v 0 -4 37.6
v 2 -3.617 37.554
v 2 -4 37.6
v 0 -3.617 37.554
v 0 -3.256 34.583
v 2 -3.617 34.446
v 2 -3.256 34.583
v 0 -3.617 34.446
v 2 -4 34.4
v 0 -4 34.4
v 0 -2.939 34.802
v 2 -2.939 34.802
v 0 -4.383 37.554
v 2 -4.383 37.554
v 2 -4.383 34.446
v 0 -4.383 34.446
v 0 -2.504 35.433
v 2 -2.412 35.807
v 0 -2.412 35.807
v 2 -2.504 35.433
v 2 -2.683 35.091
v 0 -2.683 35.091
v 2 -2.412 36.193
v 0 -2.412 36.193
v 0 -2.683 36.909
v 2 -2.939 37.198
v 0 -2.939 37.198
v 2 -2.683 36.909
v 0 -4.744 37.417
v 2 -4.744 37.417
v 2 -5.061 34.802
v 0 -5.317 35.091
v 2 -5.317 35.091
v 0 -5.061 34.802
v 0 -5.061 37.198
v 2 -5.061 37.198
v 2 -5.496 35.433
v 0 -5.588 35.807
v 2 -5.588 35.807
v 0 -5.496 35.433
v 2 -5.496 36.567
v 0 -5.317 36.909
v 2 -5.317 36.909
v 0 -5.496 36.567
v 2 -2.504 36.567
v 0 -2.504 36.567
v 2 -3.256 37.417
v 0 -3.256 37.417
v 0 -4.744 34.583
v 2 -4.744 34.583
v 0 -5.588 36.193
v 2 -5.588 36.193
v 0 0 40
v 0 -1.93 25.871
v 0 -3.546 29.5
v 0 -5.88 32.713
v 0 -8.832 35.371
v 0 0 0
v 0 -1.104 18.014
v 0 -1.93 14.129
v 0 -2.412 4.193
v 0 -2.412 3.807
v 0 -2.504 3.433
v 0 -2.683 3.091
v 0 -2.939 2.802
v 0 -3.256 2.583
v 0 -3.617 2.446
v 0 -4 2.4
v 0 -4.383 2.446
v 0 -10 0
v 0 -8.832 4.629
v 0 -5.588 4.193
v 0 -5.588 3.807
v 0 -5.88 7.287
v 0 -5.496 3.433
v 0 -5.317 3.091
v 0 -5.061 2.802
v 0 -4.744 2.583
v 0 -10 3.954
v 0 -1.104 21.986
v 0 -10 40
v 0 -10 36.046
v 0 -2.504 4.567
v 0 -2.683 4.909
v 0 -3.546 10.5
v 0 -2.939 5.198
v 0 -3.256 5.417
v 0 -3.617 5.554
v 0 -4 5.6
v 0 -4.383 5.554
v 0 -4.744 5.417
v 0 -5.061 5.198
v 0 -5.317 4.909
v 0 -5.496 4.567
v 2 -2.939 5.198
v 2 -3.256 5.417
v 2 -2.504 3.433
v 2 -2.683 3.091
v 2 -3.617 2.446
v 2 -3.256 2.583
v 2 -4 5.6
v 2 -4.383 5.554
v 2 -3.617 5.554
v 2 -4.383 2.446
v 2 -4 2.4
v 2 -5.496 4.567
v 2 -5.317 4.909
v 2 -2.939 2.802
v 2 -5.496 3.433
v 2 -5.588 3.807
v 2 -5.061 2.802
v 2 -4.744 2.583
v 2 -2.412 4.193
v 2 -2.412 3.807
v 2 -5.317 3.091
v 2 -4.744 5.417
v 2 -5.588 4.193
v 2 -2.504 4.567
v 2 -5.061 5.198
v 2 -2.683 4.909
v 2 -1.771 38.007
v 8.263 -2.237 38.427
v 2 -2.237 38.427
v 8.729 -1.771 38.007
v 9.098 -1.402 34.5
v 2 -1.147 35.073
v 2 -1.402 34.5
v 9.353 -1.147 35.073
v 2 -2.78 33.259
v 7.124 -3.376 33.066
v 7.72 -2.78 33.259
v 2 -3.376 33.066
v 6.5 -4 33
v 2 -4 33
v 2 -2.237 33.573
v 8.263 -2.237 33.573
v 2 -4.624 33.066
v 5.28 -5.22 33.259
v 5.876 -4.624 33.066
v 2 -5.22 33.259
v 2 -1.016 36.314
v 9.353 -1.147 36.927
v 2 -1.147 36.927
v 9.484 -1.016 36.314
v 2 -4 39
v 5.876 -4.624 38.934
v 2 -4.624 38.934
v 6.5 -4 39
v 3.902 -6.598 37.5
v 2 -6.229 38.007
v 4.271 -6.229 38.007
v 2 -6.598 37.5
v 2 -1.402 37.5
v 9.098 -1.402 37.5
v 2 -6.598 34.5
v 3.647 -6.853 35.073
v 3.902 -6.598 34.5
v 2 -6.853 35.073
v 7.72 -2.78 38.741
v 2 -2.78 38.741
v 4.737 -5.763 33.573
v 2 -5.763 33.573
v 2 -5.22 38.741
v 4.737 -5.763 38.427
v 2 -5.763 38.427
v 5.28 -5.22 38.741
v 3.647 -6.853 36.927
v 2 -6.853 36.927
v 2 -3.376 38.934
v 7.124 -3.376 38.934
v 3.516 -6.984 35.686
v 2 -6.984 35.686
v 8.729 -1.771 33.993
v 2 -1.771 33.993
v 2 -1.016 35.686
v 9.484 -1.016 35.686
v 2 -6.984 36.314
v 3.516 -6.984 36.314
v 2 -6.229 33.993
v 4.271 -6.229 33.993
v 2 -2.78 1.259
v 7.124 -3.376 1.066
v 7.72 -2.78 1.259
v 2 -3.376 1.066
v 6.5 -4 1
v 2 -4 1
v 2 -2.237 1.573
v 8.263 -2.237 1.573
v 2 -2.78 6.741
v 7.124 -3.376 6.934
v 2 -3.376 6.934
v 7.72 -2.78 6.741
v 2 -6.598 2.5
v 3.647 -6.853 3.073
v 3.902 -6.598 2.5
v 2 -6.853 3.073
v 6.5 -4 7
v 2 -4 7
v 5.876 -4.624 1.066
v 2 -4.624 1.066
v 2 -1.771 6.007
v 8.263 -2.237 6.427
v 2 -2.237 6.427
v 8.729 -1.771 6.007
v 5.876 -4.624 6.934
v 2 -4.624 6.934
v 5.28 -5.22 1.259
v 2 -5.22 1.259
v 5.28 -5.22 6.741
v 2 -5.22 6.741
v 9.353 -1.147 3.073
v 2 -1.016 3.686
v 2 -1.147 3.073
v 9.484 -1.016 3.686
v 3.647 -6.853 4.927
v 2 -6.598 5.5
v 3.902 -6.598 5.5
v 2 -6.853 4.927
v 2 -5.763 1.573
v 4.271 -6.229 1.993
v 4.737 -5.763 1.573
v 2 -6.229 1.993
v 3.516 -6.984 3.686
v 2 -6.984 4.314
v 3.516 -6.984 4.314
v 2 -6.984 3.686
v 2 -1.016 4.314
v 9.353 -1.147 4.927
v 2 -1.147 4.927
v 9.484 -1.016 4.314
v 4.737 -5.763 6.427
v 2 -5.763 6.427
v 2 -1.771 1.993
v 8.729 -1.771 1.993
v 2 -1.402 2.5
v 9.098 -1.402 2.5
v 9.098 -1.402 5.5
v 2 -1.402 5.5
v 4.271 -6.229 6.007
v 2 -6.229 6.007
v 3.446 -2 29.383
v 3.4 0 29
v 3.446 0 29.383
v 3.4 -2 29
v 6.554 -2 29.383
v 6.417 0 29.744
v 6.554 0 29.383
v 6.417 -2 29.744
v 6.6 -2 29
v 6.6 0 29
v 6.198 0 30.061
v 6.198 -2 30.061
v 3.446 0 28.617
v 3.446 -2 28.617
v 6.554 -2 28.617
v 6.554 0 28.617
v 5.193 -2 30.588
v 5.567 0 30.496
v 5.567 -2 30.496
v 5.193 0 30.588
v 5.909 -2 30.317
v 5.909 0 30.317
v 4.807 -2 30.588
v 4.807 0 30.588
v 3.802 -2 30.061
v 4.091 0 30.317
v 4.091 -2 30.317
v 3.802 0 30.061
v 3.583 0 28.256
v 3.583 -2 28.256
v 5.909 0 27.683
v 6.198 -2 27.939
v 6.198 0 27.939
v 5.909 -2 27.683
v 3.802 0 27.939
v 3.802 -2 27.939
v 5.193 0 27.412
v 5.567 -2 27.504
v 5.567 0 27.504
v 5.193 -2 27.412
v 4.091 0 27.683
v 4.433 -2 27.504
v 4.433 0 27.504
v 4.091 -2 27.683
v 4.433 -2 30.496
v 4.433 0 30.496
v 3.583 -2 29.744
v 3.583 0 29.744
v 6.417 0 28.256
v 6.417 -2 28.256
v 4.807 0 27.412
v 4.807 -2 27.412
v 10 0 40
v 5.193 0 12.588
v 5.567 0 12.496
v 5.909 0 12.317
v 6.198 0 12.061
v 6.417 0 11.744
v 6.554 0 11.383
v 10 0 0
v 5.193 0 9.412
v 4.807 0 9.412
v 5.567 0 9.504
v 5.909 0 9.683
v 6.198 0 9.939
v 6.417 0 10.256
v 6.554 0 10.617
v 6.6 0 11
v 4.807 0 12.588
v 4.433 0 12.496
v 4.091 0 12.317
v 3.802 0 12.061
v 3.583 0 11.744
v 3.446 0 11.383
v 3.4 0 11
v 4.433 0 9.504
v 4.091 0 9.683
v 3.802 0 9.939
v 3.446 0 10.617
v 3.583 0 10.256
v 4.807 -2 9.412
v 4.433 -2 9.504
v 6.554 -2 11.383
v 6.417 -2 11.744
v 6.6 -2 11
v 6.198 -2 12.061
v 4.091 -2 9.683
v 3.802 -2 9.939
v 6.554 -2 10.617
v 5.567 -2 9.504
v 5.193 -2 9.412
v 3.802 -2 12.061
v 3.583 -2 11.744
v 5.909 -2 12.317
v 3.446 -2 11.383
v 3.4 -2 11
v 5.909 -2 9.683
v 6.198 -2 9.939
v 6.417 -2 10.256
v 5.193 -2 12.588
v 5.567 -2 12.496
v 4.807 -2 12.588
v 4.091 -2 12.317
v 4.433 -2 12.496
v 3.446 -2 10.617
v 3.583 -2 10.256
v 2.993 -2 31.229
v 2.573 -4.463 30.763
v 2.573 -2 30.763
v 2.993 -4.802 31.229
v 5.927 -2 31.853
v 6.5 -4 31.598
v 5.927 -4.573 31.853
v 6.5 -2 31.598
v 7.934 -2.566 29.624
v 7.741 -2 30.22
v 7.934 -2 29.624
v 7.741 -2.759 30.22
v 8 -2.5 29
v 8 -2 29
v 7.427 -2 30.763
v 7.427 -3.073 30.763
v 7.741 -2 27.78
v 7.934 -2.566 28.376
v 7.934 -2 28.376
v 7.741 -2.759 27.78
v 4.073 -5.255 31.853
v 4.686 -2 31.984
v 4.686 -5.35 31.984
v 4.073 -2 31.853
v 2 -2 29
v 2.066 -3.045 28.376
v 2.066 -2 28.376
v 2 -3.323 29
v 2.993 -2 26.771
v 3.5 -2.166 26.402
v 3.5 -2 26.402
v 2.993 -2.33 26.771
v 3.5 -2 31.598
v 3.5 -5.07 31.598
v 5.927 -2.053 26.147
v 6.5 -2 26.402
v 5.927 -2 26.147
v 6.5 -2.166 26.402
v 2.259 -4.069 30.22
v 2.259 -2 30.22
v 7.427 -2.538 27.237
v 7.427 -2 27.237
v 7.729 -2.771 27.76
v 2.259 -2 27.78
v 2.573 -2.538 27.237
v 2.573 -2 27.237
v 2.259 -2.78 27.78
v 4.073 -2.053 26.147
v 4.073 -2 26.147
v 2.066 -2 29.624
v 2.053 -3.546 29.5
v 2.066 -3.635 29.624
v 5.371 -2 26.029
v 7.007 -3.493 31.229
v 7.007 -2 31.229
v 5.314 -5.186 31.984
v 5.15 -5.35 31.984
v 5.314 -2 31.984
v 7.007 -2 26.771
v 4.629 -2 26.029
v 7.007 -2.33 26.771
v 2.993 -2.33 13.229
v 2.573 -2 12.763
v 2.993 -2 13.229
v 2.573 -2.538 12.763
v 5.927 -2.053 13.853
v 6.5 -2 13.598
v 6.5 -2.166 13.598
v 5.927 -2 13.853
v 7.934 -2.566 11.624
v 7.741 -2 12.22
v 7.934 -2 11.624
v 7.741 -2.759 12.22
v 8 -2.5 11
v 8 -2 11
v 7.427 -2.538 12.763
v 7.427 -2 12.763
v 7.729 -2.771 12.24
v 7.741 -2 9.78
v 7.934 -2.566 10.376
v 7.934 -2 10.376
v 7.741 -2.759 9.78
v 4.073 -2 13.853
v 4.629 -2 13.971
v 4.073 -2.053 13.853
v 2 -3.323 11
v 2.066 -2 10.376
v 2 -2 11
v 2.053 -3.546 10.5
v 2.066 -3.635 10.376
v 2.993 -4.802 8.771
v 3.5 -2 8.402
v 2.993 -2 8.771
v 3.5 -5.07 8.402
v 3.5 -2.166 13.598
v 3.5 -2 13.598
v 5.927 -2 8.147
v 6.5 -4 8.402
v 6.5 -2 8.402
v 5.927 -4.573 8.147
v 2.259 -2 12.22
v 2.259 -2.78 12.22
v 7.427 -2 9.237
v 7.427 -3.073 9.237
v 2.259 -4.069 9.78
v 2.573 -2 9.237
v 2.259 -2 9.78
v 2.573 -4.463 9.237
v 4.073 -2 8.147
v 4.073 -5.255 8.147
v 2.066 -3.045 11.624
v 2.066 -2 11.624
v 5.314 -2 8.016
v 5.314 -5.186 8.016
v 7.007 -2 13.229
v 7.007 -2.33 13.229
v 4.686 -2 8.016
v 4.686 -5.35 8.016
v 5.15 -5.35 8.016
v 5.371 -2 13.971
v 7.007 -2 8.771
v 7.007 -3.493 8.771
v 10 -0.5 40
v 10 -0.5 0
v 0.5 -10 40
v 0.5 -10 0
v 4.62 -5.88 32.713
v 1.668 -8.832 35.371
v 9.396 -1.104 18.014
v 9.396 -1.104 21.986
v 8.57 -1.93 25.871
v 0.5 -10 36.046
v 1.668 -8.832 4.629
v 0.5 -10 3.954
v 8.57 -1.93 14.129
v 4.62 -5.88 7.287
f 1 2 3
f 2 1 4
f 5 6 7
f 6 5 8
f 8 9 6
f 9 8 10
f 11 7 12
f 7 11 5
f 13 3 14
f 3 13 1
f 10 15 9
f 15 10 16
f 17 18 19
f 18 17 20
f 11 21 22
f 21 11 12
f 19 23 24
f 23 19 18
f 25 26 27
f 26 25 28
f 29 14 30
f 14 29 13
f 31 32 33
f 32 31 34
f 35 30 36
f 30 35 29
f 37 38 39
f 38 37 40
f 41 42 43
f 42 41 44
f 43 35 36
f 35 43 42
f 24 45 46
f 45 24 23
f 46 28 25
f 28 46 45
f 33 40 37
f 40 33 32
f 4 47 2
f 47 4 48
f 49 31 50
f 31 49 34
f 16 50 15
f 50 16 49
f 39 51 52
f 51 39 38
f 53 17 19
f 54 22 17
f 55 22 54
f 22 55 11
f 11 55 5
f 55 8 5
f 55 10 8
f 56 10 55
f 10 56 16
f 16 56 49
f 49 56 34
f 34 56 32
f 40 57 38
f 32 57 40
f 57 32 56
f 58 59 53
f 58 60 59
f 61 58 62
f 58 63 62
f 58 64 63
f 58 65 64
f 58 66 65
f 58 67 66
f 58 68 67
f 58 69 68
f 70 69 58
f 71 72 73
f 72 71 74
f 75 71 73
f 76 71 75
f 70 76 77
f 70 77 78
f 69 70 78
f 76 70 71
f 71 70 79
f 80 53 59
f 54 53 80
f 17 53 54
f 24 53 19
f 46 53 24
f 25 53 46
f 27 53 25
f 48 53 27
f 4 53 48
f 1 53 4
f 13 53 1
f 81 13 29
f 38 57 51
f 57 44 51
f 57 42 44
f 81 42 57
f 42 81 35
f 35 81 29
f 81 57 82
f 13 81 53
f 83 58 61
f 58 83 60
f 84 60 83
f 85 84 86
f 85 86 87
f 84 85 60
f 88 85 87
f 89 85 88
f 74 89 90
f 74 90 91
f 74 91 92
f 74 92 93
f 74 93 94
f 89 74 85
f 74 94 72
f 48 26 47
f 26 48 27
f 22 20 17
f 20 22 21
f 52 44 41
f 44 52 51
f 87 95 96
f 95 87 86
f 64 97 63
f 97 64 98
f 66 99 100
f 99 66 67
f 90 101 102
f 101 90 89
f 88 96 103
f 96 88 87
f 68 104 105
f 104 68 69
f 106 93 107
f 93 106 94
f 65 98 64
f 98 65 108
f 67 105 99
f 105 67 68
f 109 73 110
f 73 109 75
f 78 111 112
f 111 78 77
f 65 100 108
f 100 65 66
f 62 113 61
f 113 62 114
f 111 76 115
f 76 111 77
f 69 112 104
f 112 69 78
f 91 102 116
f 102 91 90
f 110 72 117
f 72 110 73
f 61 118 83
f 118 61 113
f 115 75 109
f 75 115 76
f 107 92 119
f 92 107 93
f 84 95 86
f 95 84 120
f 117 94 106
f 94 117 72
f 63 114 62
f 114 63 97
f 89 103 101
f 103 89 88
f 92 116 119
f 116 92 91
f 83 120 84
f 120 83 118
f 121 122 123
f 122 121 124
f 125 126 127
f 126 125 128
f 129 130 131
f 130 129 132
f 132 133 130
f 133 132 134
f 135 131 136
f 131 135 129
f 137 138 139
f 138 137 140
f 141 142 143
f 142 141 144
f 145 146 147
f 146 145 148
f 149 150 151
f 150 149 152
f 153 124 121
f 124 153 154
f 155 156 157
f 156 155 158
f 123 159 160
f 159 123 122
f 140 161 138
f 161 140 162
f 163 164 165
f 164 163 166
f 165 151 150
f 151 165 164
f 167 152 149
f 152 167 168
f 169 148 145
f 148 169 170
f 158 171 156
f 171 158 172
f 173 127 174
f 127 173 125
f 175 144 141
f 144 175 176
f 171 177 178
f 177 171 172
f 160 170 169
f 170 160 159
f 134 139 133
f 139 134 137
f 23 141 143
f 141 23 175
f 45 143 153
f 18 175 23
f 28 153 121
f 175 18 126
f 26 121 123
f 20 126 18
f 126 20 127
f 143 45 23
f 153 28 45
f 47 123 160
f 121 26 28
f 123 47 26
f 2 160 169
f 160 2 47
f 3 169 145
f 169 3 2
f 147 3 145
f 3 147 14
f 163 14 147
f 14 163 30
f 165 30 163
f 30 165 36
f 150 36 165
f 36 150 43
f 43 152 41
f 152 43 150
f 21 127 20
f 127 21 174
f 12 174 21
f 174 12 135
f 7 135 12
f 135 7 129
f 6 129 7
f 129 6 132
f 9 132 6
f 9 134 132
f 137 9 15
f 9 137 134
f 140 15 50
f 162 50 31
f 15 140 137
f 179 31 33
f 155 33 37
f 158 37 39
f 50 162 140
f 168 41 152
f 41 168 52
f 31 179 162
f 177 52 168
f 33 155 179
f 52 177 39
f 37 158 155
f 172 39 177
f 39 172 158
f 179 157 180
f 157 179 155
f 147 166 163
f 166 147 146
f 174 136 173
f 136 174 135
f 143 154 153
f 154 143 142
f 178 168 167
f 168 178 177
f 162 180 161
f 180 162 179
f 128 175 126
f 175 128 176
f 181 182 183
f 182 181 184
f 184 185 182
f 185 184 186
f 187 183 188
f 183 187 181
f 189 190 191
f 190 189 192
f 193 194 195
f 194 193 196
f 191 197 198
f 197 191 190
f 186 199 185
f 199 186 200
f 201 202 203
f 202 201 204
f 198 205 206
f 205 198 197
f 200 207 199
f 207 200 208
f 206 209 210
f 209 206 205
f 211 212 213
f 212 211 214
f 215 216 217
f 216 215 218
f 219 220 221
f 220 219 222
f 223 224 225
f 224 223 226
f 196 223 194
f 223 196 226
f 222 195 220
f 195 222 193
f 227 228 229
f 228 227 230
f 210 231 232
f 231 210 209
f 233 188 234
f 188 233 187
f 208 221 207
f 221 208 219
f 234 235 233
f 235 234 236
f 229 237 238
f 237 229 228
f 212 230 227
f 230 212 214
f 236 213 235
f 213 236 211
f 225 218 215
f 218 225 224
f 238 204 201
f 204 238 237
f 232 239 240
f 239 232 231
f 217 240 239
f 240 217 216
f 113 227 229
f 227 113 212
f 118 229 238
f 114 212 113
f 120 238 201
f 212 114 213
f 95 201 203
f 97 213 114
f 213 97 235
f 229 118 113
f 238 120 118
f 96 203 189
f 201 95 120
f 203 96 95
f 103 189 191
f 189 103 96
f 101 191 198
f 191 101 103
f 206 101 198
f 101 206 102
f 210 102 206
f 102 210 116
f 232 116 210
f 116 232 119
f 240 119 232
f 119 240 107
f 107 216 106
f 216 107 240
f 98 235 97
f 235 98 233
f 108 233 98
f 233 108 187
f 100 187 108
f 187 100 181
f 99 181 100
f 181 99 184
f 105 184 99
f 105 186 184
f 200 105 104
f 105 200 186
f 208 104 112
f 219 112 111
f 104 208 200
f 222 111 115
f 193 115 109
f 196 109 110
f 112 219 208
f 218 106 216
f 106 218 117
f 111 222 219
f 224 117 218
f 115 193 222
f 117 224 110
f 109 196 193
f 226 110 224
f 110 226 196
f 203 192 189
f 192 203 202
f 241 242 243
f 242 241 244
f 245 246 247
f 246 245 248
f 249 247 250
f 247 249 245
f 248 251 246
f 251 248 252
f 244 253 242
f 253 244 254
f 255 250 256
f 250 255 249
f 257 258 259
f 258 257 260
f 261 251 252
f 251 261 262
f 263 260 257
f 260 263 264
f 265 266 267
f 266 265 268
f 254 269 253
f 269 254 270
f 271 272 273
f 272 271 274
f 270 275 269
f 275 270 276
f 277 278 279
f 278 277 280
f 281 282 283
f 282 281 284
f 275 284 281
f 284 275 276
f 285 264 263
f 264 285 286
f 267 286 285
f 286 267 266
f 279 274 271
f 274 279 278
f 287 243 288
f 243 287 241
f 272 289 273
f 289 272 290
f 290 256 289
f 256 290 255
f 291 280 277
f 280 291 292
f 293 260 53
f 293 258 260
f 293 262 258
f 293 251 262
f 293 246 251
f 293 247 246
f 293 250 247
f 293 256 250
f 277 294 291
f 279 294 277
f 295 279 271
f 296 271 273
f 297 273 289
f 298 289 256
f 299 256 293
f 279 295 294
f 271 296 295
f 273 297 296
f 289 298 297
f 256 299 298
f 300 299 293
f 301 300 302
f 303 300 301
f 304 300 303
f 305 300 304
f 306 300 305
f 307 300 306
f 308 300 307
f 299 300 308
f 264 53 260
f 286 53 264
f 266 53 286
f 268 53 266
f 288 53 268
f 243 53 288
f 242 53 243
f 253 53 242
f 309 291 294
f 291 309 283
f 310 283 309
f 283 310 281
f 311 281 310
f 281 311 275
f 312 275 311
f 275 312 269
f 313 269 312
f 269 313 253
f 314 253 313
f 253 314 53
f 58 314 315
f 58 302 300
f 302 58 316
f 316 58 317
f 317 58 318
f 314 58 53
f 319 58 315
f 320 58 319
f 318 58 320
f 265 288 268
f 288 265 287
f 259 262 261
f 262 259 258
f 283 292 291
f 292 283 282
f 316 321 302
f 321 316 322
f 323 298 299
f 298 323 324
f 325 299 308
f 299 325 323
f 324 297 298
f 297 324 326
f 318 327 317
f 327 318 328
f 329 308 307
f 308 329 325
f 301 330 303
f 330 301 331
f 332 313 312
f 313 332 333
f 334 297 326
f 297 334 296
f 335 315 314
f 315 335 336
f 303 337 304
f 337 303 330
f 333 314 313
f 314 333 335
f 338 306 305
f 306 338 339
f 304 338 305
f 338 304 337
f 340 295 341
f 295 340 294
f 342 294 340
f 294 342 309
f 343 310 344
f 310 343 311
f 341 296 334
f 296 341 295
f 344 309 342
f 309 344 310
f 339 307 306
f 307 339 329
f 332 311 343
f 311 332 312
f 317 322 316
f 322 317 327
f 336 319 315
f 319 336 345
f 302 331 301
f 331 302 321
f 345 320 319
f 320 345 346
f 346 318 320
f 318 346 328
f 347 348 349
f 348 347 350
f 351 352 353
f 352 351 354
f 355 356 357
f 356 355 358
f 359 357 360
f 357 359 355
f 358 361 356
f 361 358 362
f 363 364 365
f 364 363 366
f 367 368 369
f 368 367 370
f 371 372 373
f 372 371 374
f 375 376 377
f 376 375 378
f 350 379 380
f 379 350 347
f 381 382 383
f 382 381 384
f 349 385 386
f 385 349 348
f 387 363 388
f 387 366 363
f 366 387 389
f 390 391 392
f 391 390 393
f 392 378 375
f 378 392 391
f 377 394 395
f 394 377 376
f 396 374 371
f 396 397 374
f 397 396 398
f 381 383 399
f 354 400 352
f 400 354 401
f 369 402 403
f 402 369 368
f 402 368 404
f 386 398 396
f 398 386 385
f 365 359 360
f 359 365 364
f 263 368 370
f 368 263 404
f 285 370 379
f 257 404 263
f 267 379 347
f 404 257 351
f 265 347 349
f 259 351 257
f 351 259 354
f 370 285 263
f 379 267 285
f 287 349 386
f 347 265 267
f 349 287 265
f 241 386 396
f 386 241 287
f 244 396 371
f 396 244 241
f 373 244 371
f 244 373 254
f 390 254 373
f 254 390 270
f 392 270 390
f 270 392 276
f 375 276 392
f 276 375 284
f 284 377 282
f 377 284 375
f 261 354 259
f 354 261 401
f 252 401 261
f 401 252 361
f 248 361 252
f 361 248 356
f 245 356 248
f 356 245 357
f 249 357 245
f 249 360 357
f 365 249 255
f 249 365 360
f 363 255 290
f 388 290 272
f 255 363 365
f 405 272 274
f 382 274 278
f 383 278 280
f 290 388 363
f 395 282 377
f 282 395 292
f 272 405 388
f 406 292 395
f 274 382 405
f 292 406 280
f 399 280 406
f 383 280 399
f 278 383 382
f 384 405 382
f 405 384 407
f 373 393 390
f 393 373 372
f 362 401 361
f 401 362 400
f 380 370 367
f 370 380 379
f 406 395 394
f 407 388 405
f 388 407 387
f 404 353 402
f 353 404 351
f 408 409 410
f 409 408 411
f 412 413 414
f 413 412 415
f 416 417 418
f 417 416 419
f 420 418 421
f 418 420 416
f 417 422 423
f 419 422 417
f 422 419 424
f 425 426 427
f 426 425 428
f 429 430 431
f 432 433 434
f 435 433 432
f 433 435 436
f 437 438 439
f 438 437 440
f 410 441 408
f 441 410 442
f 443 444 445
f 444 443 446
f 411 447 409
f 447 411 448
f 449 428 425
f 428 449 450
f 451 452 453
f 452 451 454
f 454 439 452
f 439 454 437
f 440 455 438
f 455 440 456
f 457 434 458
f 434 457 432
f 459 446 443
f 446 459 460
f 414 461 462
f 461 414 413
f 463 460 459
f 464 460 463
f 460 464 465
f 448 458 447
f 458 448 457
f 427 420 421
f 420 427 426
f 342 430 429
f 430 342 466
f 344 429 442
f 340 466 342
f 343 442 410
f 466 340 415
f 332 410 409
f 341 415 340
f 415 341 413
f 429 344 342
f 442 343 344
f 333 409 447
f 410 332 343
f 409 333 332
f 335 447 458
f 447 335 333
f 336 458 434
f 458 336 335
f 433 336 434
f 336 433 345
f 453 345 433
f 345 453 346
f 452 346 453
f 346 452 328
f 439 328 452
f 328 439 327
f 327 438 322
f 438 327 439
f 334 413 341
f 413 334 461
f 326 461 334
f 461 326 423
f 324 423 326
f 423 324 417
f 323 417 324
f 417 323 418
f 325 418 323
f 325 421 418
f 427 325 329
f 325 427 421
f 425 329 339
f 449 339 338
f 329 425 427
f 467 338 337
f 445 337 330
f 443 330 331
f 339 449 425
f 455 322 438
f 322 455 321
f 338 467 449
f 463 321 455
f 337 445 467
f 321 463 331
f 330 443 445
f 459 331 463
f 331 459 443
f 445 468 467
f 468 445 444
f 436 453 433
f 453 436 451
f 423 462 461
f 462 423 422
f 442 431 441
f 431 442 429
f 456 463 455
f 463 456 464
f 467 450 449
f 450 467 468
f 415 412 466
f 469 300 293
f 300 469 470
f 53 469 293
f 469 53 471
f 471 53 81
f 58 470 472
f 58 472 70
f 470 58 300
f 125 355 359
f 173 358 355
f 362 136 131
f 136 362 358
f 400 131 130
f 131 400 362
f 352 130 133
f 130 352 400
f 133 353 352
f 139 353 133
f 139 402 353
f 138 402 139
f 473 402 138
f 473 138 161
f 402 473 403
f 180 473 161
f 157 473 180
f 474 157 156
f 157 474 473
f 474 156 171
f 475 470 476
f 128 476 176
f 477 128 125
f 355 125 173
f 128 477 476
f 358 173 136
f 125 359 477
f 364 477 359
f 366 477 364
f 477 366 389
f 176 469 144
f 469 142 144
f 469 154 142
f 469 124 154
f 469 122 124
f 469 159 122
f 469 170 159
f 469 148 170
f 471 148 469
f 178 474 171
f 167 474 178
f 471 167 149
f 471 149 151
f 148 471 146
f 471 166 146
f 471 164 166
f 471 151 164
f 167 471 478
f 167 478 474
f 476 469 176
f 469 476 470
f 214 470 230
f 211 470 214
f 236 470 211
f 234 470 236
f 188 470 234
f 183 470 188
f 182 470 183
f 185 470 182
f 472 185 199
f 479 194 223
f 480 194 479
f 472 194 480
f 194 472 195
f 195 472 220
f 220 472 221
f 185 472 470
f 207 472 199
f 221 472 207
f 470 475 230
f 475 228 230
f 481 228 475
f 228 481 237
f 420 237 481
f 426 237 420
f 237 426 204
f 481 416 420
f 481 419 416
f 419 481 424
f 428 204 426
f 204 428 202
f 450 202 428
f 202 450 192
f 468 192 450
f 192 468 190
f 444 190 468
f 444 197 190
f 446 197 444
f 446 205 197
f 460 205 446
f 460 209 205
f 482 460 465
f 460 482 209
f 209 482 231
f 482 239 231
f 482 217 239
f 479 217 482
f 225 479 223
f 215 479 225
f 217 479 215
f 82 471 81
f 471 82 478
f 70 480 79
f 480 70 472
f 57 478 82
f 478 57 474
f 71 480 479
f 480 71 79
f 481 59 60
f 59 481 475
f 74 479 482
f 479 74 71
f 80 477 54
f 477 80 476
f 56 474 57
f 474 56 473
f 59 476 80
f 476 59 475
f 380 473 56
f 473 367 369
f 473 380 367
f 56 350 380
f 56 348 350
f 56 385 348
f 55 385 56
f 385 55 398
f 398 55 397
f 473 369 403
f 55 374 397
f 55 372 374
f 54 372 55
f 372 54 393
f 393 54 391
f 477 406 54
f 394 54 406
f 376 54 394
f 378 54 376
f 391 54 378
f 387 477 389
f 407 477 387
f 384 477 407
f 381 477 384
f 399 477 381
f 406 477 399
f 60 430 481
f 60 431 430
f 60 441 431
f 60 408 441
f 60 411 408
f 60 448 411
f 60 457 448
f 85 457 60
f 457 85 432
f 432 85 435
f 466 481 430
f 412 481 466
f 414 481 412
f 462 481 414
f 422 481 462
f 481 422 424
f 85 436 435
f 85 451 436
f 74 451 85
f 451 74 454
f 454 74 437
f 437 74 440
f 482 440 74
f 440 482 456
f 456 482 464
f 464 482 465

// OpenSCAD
$fs = 0.4;

module squaremount(width, height, d, thick) {
    module hole(a, b) {
        translate([a*(width/2), b*(height/2), +thick/2]) cylinder(thick, d=d, center=true);
    }
    hole(-1, 1);
    hole(1, 1);
    hole(-1, -1);
    hole(1, -1);
}

module fan_mount() {
    difference() {
        translate([0, -20, 0]) cube([10, 20, 40]);
        translate([0, -10.5, 0]) rotate([0, 0, -45]) cube([20, 20, 40]);
        
        translate([0, -20, 0]) cube([10, 10, 40]);
        translate([0, -20, 20]) rotate([0, 90, 0]) cylinder(10, d=38);
        translate([0, -20, 20]) rotate([0, 90, 0]) squaremount(32, 32, 3.2, 10);
        translate([2, -20, 20]) rotate([0, 90, 0]) squaremount(32, 32, 6, 8);
        translate([14, 0, 20]) rotate([90, 0, 0]) squaremount(18, 18, 3.2, 10);
        translate([14, -2, 20]) rotate([90, 0, 0]) squaremount(18, 18, 6, 8);
    }
}

fan_mount();
//translate([0, 0, 40]) fan_mount();
//translate([0, 0, 80]) fan_mount();
